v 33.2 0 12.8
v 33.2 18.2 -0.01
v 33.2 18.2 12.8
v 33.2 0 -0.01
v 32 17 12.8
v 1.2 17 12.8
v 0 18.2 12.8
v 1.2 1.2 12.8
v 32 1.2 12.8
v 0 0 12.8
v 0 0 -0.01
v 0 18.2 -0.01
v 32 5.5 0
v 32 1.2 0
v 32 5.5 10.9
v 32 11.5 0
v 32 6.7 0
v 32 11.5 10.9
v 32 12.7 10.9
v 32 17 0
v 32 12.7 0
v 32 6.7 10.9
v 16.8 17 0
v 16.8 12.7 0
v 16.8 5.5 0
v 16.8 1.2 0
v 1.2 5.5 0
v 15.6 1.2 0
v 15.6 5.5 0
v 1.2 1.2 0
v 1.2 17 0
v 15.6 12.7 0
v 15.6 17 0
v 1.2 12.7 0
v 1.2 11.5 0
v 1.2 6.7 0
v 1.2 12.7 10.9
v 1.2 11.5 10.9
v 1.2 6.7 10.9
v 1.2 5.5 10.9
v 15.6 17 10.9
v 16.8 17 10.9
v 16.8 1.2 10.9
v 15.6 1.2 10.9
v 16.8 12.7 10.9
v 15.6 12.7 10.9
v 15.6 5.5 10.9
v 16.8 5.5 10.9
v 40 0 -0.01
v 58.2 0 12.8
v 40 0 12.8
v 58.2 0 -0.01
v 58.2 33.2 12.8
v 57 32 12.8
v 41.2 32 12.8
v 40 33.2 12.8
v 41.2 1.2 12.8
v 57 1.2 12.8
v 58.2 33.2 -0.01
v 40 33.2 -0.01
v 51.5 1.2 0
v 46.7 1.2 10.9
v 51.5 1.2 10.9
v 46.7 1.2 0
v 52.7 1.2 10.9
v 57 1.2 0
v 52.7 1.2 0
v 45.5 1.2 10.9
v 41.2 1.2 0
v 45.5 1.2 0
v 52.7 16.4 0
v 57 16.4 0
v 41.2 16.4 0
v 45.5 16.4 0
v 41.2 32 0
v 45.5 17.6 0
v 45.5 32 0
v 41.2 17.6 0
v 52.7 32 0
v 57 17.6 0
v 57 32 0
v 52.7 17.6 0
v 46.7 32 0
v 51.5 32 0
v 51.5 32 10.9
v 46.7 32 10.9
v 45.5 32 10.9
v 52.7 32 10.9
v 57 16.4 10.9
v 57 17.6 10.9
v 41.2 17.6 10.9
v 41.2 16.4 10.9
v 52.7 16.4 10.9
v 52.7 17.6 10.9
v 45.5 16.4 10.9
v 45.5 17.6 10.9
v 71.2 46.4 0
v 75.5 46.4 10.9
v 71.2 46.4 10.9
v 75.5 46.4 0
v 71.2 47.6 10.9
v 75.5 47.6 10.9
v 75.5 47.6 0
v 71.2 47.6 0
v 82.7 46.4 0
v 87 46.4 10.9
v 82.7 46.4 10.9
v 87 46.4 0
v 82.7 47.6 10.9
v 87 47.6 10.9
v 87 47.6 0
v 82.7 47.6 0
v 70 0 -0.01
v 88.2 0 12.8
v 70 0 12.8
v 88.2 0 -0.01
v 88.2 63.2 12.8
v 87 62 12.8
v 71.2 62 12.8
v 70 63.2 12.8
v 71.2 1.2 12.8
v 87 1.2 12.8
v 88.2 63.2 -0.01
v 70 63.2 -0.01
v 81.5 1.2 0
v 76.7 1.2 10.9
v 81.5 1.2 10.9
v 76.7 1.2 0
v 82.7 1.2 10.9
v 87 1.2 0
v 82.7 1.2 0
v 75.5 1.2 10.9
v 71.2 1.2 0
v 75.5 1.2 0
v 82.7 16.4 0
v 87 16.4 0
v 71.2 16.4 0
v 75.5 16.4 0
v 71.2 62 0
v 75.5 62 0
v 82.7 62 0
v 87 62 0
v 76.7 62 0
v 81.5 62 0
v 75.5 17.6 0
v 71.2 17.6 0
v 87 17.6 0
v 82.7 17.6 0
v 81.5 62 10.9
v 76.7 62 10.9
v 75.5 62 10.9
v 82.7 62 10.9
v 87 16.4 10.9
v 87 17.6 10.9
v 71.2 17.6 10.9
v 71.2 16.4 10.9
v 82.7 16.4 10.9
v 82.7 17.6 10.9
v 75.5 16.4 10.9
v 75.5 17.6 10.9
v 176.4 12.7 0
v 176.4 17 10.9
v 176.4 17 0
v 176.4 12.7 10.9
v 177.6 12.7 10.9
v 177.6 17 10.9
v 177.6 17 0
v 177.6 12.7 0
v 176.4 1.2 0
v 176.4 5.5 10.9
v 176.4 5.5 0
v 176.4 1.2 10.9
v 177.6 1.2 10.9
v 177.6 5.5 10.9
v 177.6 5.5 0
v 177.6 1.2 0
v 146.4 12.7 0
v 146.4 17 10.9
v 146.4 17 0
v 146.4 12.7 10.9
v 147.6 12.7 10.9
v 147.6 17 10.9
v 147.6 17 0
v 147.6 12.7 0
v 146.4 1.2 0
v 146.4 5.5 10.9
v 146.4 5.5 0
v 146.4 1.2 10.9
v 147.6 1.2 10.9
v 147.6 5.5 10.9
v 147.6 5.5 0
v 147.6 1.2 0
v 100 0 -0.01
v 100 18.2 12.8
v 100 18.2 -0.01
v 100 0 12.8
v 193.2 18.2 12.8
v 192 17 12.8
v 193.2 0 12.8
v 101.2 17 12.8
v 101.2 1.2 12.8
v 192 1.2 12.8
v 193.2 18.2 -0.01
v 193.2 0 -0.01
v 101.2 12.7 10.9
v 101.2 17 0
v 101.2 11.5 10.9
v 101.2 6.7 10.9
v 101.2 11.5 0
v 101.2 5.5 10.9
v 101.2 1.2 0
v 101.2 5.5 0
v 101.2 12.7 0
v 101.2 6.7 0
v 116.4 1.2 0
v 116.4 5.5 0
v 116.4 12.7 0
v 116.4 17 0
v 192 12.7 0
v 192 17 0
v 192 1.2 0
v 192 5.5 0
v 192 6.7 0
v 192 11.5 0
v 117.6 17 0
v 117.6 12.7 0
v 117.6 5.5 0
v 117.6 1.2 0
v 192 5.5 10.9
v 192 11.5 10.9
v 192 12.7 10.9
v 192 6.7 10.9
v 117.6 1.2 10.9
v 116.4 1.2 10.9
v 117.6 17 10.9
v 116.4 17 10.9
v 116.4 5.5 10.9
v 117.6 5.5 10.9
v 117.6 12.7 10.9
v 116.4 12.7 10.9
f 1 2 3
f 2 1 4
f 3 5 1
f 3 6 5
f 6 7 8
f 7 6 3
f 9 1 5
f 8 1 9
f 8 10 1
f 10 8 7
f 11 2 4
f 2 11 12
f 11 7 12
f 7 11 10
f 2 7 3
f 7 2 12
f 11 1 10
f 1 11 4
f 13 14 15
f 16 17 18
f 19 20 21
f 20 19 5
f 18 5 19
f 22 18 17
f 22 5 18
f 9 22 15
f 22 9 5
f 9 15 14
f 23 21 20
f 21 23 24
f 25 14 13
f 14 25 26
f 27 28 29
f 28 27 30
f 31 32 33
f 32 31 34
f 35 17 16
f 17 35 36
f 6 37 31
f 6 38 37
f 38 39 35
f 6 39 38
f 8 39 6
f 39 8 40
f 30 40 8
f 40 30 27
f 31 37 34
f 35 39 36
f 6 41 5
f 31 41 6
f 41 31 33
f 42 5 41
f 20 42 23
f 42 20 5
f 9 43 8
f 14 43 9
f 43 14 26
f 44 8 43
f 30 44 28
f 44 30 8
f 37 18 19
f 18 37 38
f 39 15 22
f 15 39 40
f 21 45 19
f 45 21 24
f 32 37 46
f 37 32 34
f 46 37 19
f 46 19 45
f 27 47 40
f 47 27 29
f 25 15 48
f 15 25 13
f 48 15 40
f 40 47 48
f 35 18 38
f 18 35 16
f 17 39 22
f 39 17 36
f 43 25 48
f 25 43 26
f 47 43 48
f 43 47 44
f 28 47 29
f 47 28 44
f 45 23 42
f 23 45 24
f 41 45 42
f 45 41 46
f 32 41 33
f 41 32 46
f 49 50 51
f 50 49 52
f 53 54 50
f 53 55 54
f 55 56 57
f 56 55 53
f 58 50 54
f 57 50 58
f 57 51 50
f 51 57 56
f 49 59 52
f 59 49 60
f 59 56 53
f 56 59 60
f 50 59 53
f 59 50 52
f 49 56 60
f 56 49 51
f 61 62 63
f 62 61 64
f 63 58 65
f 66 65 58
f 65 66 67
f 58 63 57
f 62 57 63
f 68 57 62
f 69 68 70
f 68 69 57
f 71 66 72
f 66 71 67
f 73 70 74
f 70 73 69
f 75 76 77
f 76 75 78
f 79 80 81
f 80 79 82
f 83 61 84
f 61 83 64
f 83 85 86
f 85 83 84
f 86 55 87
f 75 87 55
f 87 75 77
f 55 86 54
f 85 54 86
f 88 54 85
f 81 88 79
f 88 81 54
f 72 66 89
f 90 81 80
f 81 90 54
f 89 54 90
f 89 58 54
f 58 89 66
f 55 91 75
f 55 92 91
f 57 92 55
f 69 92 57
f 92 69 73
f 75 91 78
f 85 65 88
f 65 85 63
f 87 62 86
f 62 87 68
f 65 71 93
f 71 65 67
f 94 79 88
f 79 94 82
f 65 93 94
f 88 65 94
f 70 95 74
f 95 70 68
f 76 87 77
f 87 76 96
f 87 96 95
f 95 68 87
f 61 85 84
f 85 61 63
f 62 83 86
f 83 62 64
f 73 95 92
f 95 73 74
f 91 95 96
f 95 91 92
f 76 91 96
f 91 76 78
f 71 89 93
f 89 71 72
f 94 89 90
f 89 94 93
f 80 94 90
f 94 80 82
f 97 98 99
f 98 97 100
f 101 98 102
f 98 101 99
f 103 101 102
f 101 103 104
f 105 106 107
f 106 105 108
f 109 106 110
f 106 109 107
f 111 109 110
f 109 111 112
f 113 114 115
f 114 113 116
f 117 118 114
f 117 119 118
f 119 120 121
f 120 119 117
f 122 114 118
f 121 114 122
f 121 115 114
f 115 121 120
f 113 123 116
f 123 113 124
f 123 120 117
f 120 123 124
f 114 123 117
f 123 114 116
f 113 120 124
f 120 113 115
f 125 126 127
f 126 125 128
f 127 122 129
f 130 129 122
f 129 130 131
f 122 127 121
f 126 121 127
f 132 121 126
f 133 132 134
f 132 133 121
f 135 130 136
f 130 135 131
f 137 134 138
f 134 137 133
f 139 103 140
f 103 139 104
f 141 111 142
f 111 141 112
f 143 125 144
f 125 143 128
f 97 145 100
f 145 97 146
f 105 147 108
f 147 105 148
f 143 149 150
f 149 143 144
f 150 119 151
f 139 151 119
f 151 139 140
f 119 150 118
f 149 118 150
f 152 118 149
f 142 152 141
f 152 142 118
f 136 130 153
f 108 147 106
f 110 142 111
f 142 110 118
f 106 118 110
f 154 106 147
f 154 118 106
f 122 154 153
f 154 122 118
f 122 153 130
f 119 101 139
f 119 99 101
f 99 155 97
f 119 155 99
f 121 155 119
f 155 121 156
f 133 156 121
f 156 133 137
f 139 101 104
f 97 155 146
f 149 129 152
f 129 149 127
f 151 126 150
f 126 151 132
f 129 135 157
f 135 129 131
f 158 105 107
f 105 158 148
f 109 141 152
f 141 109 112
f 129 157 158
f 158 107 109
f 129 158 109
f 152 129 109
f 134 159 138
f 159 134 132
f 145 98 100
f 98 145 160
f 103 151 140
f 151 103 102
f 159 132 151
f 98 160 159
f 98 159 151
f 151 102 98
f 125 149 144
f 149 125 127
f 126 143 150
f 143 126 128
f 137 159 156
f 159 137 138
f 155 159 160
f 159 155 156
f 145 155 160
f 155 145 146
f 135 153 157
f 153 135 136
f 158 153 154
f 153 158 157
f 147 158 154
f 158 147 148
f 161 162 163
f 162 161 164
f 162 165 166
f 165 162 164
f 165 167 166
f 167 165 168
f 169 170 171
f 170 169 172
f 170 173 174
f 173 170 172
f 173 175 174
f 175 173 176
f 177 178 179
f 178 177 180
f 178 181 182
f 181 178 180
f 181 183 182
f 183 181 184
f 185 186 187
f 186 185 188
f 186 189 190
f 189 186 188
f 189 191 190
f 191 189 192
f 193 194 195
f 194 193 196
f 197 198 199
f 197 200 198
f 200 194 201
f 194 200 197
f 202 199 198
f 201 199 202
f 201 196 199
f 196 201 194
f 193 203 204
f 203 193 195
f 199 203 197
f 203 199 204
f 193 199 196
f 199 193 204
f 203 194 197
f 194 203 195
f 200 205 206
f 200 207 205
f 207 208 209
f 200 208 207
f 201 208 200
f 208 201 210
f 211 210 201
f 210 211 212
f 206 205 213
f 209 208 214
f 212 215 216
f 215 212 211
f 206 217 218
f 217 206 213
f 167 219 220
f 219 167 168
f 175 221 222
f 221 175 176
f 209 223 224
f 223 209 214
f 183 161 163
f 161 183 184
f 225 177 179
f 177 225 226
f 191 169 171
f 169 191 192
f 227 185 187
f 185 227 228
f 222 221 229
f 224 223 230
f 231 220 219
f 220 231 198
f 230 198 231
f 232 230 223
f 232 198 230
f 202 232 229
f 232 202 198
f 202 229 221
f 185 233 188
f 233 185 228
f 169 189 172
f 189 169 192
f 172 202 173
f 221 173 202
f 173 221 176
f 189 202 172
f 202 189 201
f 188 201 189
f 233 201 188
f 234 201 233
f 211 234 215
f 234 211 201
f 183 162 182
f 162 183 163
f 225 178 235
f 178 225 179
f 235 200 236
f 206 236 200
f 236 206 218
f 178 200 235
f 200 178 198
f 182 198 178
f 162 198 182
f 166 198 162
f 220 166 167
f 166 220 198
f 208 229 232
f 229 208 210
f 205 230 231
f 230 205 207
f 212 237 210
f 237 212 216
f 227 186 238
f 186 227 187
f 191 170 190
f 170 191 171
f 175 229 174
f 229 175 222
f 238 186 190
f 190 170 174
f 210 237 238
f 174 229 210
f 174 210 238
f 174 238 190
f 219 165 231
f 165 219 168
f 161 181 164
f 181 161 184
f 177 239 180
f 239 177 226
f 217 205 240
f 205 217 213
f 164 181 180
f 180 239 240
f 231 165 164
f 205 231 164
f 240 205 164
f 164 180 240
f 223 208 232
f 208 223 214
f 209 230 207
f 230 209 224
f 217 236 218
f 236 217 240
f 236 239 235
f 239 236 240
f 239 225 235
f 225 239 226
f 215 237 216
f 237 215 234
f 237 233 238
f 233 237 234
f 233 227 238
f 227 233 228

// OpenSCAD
// file: ../../Base/Boxes.scad
// Fischertechnik Box Foundation
// Pre-designed Boxes

use <Constants.scad>

include <PlacementOptions.scad>

box190Width = 190;
box190Depth = 130;
box130Width = 130;
box130Depth = 95;
boxUsageHeight = 33.9;
boxWallThickness = 2.4;
boxBaseThickness = 1.0;

// getBoxWallThickness()
// Gets the wall thickness of a Fischertechnik Box

function getBoxWallThickness() = boxWallThickness;

// Gets the usable height of a fischertechnik box
function getBoxUsageHeight() = boxUsageHeight;

// Gets the thickness of the Fischertechnik box base.
function getBoxBaseThickness() = boxBaseThickness;

// Gets the usable inner space of a Box 190 as an x/y-list
function getBox190Space() = [
    box190Width - 2*getBoxWallThickness(), 
    box190Depth - 2*getBoxWallThickness() ];

// Imports the Fischertechnik empty box 130x190 mm and places it at position 0,0
// 190x130 are the outer sizes, the inner space is slightly smaller. Use getBox190Space() to get the inner sizes.
// This module needs the STL file "Fischertechnik Box 130x190.stl" in the library path.
// The box is positioned that the usable inner space is at the 0,0,0 position. The

module Box190() {
    translate([-getBoxWallThickness(),-getBoxWallThickness(),-getBoxBaseThickness()])
        import("Fischertechnik Box 130x190.stl", convexity=3);
}

// Gets the usable inner space of a Box 130 as an x/y-list
function getBox130Space() = [
    box130Width - 2*getBoxWallThickness(), 
    box130Depth - 2*getBoxWallThickness() ];

// Imports the Fischertechnik empty box 95x130 mm and places it at position 0,0
// 190x130 are the outer sizes, the inner space is slightly smaller. Use getBox190Space() to get the inner sizes.
// This module needs the STL file "Fischertechnik Box 95x130.stl" in the library path.
// The box is positioned that the usable inner space is at the 0,0,0 position. The

module Box130() {
    translate([-getBoxWallThickness(),-getBoxWallThickness(),-getBoxBaseThickness()])
        import("Fischertechnik Box 95x130.stl", convexity=3);
}

// Creates a web at the specified box walls
// corner 0 = LowerLeft, 1 = UpperLeft, 2 = UpperRight, 3 = LowerRight
// side 0 = LeftOfCorner, 1 = RightOfCorner
// distance = Distance in mm from the corner
// box = inner width and depth of the box (default: Box 190)
// webWidth = length of the web (default is 3 mms)
// webThickness = thickness of the web (default is 1 mm)

module BoxWeb(corner, side, distance, box=getBox190Space(), webWidth=3, webThickness=1.0) {
    sink = getBoxWallThickness()/2;

    width = (corner % 2 == 0) ? 
            (side == LeftOfCorner ? webWidth : webThickness) :
            (side == LeftOfCorner ? webThickness : webWidth);

    depth = (corner % 2 == 0) ? 
            (side == RightOfCorner ? webWidth : webThickness) :
            (side == RightOfCorner ? webThickness : webWidth);
    
    xDiff = corner == LowerLeft ? 
                (side == LeftOfCorner ? -sink : distance) :
            (corner == UpperLeft ?                
                (side == LeftOfCorner ? distance : -sink) :
            (corner == UpperRight ?
                (side == LeftOfCorner ? box.x-webWidth+sink : box.x-distance-webThickness) :
                (side == LeftOfCorner ? box.x-distance-webThickness: box.x-webWidth+sink)));

    yDiff = corner == LowerLeft ? 
                (side == RightOfCorner ? -sink : distance) :
            (corner == UpperLeft ?
                (side == RightOfCorner ? box.y-distance : box.y-webWidth+sink) :
            (corner == UpperRight ?
                (side == RightOfCorner ? box.y-webWidth+sink : box.y-distance) :
                (side == RightOfCorner ? distance : -sink)));
    
    translate([xDiff, yDiff, -getExcess()])
        cube([width, depth, boxUsageHeight + 2*getExcess()]);
}
// file: ../../Base/Rotation.scad
// Fischertechnik Box Foundation
// Geometry Helpers Rotation

include <PlacementOptions.scad>

// getRotatedSpace(space, rotation=NoRotation)
// Rotates the space dependent on the specified rotation

function getRotatedSpace(space, rotation=NoRotation) = [
    (rotation == Rotate90 || rotation == Rotate270) ? space.y : space.x,
    (rotation == Rotate90 || rotation == Rotate270) ? space.x : space.y
];

// Rotates the given space around the fixed left lower corner
// space = the space the children needs as width/depth list [width,depth]
// rotation = 0 Rotate0 degrees, 1 Rotate90 degrees, 2 Rotate180 degrees, 3 Rotate270 degrees (equivalent to -90)

module RotateFix(space, rotation=Rotate0) {
    dy = (rotation == Rotate0 || rotation == Rotate270) ? 0 :
        (rotation == Rotate90) ? space.x :
        space.y;
    dx = (rotation < Rotate180) ? 0 :
        (rotation == Rotate180) ? space.x :
        space.y;
    
    translate([dx, dy, 0])
        rotate([0, 0, rotations[rotation]])
            children();
}
// file: ../../Base/Alignment.scad
// Fischertechnik Box Foundation
// Geometry Helpers Alignment

include <PlacementOptions.scad>

// getAlignedX(elementWidth, spaceWidth, align=AlignRight, offset=0)
// Gets the aligned X offset of an element with the given
// width in the given space.
// elementWidth = The width of the element to positon
// spaceWidth = The space where the element should be aligned
// align = 0 AlignLeft, 1 AlignCenter, 2 AlignRight
// offset = an optional offset from the aligned position. When
// aligned left or centered, then positive values are in X direction.
// When aligned right then positive values are in negative X direction.

function getAlignedX(elementWidth, spaceWidth, align=AlignRight, offset=0) =
    (align == AlignLeft) ?
        offset :
        ((align == AlignCenter) ?
        (spaceWidth - elementWidth)/2 + offset :
        spaceWidth - offset - elementWidth);

// getAlignedY(elementDepth, spaceDepth, align=AlignTop, offset=0)
// Gets the aligned Y offset of an element with the given
// depth in the given space.
// elementDepth = The depth of the element to positon
// spaceDepth = The space where the element should be aligned
// align = 0 AlignBottom, 1 AlignCenter, 2 AlignTop
// offset = an optional offset from the aligned position. When
// aligned bottom or centered, then positive values are in Y direction.
// When aligned top then positive values are in negative Y direction.

function getAlignedY(elementDepth, spaceDepth, align=AlignTop, offset=0) =
    (align == AlignBottom) ?
        offset :
        ((align == AlignCenter) ?
        (spaceDepth - elementDepth)/2 + offset :
        spaceDepth - offset - elementDepth);
// file: ../../Base/Constants.scad
// Fischertechnik Box Foundation
// Constants

// Constant values necessary for multiple elements

// Base constants
dividerThickness = 1.2;
excess = 0.01;
fragments = 90;
tolerance = 0.8;

// Gets the thickness of a divider 
function getDividerThickness() = dividerThickness;

// Gets the excess that is used to merge walls into each other
function getExcess() = excess;

// Gets amount of fragments of a cylinder
function getFragments() = fragments;

// Gets the inner tolerance of a frame to each side
function getTolerance() = tolerance;


// Fischertechnik specific constants
axisDiameter = 4;
axisBottomDiameter = axisDiameter + 1;
standardEdgeDistance = 2.5;
standardWebDistance = 11.5;
standardCornerLength = 15;
tubeWallFactor = 1.6;

// Gets axis diameter
function getAxisDiameter() = axisDiameter;

// Gets axis bottom diameter for thicker part at the bottom
function getAxisBottomDiameter() = axisBottomDiameter;

// gets the standard distance to the wall of the box for dockable frames with webs
function getStandardEdgeDistance() = standardEdgeDistance;

// gets the standard distance of each web to the corner of the dockable frame
function getStandardWebDistance() = standardWebDistance;

// gets the standard length of the corner walls of a dockable frame
function getStandardCornerLength() = standardCornerLength;

// gets the wall thickness of a tube.
function getTubeWallThickness() = tubeWallFactor * getDividerThickness();
// file: ../../Base/PlacementOptions.scad
// Fischertechnik Box Foundation
// Placement Options

// Alignment
NoAlign = 0;
AlignLeft = 1;
AlignBottom = 2;
AlignCenter = 3;
AlignRight = 4;
AlignTop = 5;

// Element rotation degree steps
rotations = [0, -90, -180, -270];

// Rotation
NoRotation = 0;
Rotate0 = 0;
Rotate90 = 1;
Rotate180 = 2;
Rotate270 = 3;

// Docking (seen from above)
NoDock = -1;
DockLeft = 0;
DockTop = 1;
DockRight = 2;
DockCorner = 2;
DockBottom = 3;

// Web corners
LowerLeft = 0;
UpperLeft = 1;
UpperRight = 2;
LowerRight = 3;

// Web position relative to corner
LeftOfCorner = 0;
RightOfCorner = 1;
// file: ../../Elements/FrameRack30.scad
// Fischertechnik Box Library
// Frame for Rack 30
// 31054

use <../Base/Constants.scad>
use <../ModelBase/Complex.scad>

width = 30;
depth = 15;
height = 12.8;
factor = 1; // 30 mm

// getFrameRack30Space(count=1)
// Gets the space for a frame for count racks 30 in one row.

function getFrameRack30Space(count=1) = getFrameRackSpace(factor*count, 1);

// FrameRack(count)
// Frame for rack 30. The racks 30 are ordered in line.
// count = Count of racks in one row

module FrameRack30(count=1) {
    FrameRack(factor*count, 1);
}

// Test
color("lightgray")
FrameRack30();
// file: ../../Base/Placement.scad
// Fischertechnik Box Foundation
// Geometry Helpers Placement

use <Constants.scad>
use <Alignment.scad>
use <Rotation.scad>
use <Boxes.scad>

include <PlacementOptions.scad>

// Place(x=0, y=0, elementSpace=[0,0], alignX=AlignLeft, alignY=AlignBottom, rotation=Rotate0, boxSpace=getBox190Space())
// Places the child at the specified position
// y = Y-Position. This is a relative position when an X aligment is specified.
// x = X-Position. This is a relative position when an Y aligment is specified.
// elementSpace = space of the element to be placed [x,y]
// alignX = -1=NoAlign, 0 AlignLeft, 1 AlignCenter, 3 AlignRight (elementSpace and boxSpace required!)
// alignY = -1=NoAlign, 2 AlignBottom, 1 AlignCenter, 4 AlignTop (elementSpace and boxSpace required!)
// rotation = 0 Rotate0 0 degrees, 1 Rotate90 90 degrees, 
// 2 Rotate180 180 degrees, 3 Rotate270 270 degrees (equivalent to -90)
// boxSpace = Inner space of the box where the placement occurs [x,y] - default is Box 190x130 inner space

module Place(x=0, y=0, elementSpace=[0,0], 
  alignX=AlignLeft, alignY=AlignBottom, 
  rotation=NoRotation, boxSpace=getBox190Space()) {

    module Position(x, y, space, rotation=Rotate0) {
        translate([x, y, 0])
            RotateFix(space, rotation)
                children(0);
    }

    space = getRotatedSpace(elementSpace, rotation);
    alignedX = getAlignedX(space.x, boxSpace.x, alignX, x);
    alignedY = getAlignedY(space.y, boxSpace.y, alignY, y);
    Position(alignedX, alignedY, elementSpace, rotation)
        children(0);
}

// Center(space=getBox130Space(), elementSpace=[0,0])
// space = Space where the children is centered. For cylinder use centered=true and no elementSpace.
// elementSpace = space of the element to be centered [x,y]

module Center(space=getBox190Space(), elementSpace=[0,0]) {
    translate([(space.x - elementSpace.x) / 2, (space.y - elementSpace.y) / 2])
        children(0);
}

// CenterHorizontal(width=0, y=0, offset=0, space=getBox130Space())
// space = Space where the children is centered. For cylinder use centered=true and no elementSpace.
// elementSpace = space of the element to be centered [x,y]

module CenterHorizontal(width=0, y=0, offset=0, space=getBox190Space()) {
    translate([(space.x - width) / 2 + offset, y])
        children(0);
}

// CenterVertical(depth=0, x=0, offset=0, space=getBox130Space())
// space = Space where the children is centered. For cylinder use centered=true and no elementSpace.
// elementSpace = space of the element to be centered [x,y]

module CenterVerticalal(depth=0, x=0, offset=0, space=getBox190Space()) {
    translate([x, (space.y - depth) / 2 + offset])
        children(0);
}
// main file
// Fischertechnik Box Foundation
// Elements
// Test FrameRack30

use <../../Base/Placement.scad>
use <../../Elements/FrameRack30.scad>

include <../../Base/PlacementOptions.scad>

FrameRack30();

Place(40, 0, getFrameRack30Space(), rotation=Rotate90)
    FrameRack30();

Place(70, 0, getFrameRack30Space(2), rotation=Rotate90)
    FrameRack30(2);

Place(100, 0, getFrameRack30Space(3), rotation=Rotate180)
    FrameRack30(3);
